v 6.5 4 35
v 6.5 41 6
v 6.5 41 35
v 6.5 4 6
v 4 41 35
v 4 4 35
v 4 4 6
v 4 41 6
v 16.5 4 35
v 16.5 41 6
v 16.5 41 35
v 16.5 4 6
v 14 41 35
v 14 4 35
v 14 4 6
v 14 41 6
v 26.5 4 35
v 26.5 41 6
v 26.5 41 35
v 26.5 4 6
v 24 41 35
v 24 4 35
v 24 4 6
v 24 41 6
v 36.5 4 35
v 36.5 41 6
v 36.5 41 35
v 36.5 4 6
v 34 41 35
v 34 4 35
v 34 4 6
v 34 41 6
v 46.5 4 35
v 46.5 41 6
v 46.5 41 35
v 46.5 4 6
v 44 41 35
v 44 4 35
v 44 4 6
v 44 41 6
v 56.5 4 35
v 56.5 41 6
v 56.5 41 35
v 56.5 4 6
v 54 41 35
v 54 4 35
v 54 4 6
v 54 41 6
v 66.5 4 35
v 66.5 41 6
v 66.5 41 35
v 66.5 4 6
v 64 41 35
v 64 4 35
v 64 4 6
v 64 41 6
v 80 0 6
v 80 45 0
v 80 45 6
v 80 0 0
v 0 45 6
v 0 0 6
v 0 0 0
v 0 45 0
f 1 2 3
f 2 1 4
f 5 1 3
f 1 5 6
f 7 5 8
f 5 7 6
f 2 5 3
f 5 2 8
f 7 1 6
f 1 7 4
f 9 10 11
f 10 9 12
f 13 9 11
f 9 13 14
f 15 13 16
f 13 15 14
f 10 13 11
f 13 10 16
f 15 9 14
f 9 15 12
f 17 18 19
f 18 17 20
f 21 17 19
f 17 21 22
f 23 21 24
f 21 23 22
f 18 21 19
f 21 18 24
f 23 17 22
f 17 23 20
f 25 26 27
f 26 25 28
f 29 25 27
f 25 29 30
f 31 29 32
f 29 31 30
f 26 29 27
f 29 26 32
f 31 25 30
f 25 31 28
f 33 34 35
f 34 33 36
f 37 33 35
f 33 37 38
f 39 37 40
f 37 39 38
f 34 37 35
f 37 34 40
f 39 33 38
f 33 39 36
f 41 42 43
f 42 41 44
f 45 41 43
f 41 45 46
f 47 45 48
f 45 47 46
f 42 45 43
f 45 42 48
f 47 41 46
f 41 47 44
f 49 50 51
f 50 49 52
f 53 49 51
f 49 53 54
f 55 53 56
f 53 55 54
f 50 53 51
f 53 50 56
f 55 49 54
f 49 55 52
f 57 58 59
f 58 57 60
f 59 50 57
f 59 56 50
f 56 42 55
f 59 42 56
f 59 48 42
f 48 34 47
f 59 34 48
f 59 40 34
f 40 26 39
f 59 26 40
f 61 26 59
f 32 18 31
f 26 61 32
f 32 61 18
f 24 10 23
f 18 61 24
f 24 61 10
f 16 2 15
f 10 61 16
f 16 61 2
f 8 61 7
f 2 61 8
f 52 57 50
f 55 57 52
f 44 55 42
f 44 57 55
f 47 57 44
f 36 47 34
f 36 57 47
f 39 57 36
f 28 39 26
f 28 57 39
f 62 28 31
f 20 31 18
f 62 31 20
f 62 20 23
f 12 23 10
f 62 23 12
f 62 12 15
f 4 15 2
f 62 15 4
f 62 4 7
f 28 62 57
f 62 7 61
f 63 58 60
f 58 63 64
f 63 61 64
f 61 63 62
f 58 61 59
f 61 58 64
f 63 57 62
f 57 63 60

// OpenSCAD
$fn = 32;

// ----------------------------------------------------------------------
// Heatsink: uniform fin block
// ----------------------------------------------------------------------

// --- parameters (mm) ---
base_l = 80;              // base length, X
base_w = 45;              // base width, Y
base_t = 6;               // base plate thickness
fin_h = 30;               // fin height above the base
fin_t = 2.5;              // fin thickness
edge = 4;                 // margin from the base ends
pitch = 10;               // fin pitch
fit_tol = 0.1;            // tolerance for press fits, mm
free_tol = 0.5;           // tolerance for clearance fits, mm

n_fins = floor((base_l - 2 * edge - fin_t) / pitch) + 1;  // fin count
total_h = base_t + fin_h - 1;  // overall height

union() {
  cube([base_l, base_w, base_t]);
  for (i = [0 : n_fins - 1])
    translate([edge + i * pitch, edge, base_t - 1])
      cube([fin_t, base_w - 2 * edge, fin_h]);
}
